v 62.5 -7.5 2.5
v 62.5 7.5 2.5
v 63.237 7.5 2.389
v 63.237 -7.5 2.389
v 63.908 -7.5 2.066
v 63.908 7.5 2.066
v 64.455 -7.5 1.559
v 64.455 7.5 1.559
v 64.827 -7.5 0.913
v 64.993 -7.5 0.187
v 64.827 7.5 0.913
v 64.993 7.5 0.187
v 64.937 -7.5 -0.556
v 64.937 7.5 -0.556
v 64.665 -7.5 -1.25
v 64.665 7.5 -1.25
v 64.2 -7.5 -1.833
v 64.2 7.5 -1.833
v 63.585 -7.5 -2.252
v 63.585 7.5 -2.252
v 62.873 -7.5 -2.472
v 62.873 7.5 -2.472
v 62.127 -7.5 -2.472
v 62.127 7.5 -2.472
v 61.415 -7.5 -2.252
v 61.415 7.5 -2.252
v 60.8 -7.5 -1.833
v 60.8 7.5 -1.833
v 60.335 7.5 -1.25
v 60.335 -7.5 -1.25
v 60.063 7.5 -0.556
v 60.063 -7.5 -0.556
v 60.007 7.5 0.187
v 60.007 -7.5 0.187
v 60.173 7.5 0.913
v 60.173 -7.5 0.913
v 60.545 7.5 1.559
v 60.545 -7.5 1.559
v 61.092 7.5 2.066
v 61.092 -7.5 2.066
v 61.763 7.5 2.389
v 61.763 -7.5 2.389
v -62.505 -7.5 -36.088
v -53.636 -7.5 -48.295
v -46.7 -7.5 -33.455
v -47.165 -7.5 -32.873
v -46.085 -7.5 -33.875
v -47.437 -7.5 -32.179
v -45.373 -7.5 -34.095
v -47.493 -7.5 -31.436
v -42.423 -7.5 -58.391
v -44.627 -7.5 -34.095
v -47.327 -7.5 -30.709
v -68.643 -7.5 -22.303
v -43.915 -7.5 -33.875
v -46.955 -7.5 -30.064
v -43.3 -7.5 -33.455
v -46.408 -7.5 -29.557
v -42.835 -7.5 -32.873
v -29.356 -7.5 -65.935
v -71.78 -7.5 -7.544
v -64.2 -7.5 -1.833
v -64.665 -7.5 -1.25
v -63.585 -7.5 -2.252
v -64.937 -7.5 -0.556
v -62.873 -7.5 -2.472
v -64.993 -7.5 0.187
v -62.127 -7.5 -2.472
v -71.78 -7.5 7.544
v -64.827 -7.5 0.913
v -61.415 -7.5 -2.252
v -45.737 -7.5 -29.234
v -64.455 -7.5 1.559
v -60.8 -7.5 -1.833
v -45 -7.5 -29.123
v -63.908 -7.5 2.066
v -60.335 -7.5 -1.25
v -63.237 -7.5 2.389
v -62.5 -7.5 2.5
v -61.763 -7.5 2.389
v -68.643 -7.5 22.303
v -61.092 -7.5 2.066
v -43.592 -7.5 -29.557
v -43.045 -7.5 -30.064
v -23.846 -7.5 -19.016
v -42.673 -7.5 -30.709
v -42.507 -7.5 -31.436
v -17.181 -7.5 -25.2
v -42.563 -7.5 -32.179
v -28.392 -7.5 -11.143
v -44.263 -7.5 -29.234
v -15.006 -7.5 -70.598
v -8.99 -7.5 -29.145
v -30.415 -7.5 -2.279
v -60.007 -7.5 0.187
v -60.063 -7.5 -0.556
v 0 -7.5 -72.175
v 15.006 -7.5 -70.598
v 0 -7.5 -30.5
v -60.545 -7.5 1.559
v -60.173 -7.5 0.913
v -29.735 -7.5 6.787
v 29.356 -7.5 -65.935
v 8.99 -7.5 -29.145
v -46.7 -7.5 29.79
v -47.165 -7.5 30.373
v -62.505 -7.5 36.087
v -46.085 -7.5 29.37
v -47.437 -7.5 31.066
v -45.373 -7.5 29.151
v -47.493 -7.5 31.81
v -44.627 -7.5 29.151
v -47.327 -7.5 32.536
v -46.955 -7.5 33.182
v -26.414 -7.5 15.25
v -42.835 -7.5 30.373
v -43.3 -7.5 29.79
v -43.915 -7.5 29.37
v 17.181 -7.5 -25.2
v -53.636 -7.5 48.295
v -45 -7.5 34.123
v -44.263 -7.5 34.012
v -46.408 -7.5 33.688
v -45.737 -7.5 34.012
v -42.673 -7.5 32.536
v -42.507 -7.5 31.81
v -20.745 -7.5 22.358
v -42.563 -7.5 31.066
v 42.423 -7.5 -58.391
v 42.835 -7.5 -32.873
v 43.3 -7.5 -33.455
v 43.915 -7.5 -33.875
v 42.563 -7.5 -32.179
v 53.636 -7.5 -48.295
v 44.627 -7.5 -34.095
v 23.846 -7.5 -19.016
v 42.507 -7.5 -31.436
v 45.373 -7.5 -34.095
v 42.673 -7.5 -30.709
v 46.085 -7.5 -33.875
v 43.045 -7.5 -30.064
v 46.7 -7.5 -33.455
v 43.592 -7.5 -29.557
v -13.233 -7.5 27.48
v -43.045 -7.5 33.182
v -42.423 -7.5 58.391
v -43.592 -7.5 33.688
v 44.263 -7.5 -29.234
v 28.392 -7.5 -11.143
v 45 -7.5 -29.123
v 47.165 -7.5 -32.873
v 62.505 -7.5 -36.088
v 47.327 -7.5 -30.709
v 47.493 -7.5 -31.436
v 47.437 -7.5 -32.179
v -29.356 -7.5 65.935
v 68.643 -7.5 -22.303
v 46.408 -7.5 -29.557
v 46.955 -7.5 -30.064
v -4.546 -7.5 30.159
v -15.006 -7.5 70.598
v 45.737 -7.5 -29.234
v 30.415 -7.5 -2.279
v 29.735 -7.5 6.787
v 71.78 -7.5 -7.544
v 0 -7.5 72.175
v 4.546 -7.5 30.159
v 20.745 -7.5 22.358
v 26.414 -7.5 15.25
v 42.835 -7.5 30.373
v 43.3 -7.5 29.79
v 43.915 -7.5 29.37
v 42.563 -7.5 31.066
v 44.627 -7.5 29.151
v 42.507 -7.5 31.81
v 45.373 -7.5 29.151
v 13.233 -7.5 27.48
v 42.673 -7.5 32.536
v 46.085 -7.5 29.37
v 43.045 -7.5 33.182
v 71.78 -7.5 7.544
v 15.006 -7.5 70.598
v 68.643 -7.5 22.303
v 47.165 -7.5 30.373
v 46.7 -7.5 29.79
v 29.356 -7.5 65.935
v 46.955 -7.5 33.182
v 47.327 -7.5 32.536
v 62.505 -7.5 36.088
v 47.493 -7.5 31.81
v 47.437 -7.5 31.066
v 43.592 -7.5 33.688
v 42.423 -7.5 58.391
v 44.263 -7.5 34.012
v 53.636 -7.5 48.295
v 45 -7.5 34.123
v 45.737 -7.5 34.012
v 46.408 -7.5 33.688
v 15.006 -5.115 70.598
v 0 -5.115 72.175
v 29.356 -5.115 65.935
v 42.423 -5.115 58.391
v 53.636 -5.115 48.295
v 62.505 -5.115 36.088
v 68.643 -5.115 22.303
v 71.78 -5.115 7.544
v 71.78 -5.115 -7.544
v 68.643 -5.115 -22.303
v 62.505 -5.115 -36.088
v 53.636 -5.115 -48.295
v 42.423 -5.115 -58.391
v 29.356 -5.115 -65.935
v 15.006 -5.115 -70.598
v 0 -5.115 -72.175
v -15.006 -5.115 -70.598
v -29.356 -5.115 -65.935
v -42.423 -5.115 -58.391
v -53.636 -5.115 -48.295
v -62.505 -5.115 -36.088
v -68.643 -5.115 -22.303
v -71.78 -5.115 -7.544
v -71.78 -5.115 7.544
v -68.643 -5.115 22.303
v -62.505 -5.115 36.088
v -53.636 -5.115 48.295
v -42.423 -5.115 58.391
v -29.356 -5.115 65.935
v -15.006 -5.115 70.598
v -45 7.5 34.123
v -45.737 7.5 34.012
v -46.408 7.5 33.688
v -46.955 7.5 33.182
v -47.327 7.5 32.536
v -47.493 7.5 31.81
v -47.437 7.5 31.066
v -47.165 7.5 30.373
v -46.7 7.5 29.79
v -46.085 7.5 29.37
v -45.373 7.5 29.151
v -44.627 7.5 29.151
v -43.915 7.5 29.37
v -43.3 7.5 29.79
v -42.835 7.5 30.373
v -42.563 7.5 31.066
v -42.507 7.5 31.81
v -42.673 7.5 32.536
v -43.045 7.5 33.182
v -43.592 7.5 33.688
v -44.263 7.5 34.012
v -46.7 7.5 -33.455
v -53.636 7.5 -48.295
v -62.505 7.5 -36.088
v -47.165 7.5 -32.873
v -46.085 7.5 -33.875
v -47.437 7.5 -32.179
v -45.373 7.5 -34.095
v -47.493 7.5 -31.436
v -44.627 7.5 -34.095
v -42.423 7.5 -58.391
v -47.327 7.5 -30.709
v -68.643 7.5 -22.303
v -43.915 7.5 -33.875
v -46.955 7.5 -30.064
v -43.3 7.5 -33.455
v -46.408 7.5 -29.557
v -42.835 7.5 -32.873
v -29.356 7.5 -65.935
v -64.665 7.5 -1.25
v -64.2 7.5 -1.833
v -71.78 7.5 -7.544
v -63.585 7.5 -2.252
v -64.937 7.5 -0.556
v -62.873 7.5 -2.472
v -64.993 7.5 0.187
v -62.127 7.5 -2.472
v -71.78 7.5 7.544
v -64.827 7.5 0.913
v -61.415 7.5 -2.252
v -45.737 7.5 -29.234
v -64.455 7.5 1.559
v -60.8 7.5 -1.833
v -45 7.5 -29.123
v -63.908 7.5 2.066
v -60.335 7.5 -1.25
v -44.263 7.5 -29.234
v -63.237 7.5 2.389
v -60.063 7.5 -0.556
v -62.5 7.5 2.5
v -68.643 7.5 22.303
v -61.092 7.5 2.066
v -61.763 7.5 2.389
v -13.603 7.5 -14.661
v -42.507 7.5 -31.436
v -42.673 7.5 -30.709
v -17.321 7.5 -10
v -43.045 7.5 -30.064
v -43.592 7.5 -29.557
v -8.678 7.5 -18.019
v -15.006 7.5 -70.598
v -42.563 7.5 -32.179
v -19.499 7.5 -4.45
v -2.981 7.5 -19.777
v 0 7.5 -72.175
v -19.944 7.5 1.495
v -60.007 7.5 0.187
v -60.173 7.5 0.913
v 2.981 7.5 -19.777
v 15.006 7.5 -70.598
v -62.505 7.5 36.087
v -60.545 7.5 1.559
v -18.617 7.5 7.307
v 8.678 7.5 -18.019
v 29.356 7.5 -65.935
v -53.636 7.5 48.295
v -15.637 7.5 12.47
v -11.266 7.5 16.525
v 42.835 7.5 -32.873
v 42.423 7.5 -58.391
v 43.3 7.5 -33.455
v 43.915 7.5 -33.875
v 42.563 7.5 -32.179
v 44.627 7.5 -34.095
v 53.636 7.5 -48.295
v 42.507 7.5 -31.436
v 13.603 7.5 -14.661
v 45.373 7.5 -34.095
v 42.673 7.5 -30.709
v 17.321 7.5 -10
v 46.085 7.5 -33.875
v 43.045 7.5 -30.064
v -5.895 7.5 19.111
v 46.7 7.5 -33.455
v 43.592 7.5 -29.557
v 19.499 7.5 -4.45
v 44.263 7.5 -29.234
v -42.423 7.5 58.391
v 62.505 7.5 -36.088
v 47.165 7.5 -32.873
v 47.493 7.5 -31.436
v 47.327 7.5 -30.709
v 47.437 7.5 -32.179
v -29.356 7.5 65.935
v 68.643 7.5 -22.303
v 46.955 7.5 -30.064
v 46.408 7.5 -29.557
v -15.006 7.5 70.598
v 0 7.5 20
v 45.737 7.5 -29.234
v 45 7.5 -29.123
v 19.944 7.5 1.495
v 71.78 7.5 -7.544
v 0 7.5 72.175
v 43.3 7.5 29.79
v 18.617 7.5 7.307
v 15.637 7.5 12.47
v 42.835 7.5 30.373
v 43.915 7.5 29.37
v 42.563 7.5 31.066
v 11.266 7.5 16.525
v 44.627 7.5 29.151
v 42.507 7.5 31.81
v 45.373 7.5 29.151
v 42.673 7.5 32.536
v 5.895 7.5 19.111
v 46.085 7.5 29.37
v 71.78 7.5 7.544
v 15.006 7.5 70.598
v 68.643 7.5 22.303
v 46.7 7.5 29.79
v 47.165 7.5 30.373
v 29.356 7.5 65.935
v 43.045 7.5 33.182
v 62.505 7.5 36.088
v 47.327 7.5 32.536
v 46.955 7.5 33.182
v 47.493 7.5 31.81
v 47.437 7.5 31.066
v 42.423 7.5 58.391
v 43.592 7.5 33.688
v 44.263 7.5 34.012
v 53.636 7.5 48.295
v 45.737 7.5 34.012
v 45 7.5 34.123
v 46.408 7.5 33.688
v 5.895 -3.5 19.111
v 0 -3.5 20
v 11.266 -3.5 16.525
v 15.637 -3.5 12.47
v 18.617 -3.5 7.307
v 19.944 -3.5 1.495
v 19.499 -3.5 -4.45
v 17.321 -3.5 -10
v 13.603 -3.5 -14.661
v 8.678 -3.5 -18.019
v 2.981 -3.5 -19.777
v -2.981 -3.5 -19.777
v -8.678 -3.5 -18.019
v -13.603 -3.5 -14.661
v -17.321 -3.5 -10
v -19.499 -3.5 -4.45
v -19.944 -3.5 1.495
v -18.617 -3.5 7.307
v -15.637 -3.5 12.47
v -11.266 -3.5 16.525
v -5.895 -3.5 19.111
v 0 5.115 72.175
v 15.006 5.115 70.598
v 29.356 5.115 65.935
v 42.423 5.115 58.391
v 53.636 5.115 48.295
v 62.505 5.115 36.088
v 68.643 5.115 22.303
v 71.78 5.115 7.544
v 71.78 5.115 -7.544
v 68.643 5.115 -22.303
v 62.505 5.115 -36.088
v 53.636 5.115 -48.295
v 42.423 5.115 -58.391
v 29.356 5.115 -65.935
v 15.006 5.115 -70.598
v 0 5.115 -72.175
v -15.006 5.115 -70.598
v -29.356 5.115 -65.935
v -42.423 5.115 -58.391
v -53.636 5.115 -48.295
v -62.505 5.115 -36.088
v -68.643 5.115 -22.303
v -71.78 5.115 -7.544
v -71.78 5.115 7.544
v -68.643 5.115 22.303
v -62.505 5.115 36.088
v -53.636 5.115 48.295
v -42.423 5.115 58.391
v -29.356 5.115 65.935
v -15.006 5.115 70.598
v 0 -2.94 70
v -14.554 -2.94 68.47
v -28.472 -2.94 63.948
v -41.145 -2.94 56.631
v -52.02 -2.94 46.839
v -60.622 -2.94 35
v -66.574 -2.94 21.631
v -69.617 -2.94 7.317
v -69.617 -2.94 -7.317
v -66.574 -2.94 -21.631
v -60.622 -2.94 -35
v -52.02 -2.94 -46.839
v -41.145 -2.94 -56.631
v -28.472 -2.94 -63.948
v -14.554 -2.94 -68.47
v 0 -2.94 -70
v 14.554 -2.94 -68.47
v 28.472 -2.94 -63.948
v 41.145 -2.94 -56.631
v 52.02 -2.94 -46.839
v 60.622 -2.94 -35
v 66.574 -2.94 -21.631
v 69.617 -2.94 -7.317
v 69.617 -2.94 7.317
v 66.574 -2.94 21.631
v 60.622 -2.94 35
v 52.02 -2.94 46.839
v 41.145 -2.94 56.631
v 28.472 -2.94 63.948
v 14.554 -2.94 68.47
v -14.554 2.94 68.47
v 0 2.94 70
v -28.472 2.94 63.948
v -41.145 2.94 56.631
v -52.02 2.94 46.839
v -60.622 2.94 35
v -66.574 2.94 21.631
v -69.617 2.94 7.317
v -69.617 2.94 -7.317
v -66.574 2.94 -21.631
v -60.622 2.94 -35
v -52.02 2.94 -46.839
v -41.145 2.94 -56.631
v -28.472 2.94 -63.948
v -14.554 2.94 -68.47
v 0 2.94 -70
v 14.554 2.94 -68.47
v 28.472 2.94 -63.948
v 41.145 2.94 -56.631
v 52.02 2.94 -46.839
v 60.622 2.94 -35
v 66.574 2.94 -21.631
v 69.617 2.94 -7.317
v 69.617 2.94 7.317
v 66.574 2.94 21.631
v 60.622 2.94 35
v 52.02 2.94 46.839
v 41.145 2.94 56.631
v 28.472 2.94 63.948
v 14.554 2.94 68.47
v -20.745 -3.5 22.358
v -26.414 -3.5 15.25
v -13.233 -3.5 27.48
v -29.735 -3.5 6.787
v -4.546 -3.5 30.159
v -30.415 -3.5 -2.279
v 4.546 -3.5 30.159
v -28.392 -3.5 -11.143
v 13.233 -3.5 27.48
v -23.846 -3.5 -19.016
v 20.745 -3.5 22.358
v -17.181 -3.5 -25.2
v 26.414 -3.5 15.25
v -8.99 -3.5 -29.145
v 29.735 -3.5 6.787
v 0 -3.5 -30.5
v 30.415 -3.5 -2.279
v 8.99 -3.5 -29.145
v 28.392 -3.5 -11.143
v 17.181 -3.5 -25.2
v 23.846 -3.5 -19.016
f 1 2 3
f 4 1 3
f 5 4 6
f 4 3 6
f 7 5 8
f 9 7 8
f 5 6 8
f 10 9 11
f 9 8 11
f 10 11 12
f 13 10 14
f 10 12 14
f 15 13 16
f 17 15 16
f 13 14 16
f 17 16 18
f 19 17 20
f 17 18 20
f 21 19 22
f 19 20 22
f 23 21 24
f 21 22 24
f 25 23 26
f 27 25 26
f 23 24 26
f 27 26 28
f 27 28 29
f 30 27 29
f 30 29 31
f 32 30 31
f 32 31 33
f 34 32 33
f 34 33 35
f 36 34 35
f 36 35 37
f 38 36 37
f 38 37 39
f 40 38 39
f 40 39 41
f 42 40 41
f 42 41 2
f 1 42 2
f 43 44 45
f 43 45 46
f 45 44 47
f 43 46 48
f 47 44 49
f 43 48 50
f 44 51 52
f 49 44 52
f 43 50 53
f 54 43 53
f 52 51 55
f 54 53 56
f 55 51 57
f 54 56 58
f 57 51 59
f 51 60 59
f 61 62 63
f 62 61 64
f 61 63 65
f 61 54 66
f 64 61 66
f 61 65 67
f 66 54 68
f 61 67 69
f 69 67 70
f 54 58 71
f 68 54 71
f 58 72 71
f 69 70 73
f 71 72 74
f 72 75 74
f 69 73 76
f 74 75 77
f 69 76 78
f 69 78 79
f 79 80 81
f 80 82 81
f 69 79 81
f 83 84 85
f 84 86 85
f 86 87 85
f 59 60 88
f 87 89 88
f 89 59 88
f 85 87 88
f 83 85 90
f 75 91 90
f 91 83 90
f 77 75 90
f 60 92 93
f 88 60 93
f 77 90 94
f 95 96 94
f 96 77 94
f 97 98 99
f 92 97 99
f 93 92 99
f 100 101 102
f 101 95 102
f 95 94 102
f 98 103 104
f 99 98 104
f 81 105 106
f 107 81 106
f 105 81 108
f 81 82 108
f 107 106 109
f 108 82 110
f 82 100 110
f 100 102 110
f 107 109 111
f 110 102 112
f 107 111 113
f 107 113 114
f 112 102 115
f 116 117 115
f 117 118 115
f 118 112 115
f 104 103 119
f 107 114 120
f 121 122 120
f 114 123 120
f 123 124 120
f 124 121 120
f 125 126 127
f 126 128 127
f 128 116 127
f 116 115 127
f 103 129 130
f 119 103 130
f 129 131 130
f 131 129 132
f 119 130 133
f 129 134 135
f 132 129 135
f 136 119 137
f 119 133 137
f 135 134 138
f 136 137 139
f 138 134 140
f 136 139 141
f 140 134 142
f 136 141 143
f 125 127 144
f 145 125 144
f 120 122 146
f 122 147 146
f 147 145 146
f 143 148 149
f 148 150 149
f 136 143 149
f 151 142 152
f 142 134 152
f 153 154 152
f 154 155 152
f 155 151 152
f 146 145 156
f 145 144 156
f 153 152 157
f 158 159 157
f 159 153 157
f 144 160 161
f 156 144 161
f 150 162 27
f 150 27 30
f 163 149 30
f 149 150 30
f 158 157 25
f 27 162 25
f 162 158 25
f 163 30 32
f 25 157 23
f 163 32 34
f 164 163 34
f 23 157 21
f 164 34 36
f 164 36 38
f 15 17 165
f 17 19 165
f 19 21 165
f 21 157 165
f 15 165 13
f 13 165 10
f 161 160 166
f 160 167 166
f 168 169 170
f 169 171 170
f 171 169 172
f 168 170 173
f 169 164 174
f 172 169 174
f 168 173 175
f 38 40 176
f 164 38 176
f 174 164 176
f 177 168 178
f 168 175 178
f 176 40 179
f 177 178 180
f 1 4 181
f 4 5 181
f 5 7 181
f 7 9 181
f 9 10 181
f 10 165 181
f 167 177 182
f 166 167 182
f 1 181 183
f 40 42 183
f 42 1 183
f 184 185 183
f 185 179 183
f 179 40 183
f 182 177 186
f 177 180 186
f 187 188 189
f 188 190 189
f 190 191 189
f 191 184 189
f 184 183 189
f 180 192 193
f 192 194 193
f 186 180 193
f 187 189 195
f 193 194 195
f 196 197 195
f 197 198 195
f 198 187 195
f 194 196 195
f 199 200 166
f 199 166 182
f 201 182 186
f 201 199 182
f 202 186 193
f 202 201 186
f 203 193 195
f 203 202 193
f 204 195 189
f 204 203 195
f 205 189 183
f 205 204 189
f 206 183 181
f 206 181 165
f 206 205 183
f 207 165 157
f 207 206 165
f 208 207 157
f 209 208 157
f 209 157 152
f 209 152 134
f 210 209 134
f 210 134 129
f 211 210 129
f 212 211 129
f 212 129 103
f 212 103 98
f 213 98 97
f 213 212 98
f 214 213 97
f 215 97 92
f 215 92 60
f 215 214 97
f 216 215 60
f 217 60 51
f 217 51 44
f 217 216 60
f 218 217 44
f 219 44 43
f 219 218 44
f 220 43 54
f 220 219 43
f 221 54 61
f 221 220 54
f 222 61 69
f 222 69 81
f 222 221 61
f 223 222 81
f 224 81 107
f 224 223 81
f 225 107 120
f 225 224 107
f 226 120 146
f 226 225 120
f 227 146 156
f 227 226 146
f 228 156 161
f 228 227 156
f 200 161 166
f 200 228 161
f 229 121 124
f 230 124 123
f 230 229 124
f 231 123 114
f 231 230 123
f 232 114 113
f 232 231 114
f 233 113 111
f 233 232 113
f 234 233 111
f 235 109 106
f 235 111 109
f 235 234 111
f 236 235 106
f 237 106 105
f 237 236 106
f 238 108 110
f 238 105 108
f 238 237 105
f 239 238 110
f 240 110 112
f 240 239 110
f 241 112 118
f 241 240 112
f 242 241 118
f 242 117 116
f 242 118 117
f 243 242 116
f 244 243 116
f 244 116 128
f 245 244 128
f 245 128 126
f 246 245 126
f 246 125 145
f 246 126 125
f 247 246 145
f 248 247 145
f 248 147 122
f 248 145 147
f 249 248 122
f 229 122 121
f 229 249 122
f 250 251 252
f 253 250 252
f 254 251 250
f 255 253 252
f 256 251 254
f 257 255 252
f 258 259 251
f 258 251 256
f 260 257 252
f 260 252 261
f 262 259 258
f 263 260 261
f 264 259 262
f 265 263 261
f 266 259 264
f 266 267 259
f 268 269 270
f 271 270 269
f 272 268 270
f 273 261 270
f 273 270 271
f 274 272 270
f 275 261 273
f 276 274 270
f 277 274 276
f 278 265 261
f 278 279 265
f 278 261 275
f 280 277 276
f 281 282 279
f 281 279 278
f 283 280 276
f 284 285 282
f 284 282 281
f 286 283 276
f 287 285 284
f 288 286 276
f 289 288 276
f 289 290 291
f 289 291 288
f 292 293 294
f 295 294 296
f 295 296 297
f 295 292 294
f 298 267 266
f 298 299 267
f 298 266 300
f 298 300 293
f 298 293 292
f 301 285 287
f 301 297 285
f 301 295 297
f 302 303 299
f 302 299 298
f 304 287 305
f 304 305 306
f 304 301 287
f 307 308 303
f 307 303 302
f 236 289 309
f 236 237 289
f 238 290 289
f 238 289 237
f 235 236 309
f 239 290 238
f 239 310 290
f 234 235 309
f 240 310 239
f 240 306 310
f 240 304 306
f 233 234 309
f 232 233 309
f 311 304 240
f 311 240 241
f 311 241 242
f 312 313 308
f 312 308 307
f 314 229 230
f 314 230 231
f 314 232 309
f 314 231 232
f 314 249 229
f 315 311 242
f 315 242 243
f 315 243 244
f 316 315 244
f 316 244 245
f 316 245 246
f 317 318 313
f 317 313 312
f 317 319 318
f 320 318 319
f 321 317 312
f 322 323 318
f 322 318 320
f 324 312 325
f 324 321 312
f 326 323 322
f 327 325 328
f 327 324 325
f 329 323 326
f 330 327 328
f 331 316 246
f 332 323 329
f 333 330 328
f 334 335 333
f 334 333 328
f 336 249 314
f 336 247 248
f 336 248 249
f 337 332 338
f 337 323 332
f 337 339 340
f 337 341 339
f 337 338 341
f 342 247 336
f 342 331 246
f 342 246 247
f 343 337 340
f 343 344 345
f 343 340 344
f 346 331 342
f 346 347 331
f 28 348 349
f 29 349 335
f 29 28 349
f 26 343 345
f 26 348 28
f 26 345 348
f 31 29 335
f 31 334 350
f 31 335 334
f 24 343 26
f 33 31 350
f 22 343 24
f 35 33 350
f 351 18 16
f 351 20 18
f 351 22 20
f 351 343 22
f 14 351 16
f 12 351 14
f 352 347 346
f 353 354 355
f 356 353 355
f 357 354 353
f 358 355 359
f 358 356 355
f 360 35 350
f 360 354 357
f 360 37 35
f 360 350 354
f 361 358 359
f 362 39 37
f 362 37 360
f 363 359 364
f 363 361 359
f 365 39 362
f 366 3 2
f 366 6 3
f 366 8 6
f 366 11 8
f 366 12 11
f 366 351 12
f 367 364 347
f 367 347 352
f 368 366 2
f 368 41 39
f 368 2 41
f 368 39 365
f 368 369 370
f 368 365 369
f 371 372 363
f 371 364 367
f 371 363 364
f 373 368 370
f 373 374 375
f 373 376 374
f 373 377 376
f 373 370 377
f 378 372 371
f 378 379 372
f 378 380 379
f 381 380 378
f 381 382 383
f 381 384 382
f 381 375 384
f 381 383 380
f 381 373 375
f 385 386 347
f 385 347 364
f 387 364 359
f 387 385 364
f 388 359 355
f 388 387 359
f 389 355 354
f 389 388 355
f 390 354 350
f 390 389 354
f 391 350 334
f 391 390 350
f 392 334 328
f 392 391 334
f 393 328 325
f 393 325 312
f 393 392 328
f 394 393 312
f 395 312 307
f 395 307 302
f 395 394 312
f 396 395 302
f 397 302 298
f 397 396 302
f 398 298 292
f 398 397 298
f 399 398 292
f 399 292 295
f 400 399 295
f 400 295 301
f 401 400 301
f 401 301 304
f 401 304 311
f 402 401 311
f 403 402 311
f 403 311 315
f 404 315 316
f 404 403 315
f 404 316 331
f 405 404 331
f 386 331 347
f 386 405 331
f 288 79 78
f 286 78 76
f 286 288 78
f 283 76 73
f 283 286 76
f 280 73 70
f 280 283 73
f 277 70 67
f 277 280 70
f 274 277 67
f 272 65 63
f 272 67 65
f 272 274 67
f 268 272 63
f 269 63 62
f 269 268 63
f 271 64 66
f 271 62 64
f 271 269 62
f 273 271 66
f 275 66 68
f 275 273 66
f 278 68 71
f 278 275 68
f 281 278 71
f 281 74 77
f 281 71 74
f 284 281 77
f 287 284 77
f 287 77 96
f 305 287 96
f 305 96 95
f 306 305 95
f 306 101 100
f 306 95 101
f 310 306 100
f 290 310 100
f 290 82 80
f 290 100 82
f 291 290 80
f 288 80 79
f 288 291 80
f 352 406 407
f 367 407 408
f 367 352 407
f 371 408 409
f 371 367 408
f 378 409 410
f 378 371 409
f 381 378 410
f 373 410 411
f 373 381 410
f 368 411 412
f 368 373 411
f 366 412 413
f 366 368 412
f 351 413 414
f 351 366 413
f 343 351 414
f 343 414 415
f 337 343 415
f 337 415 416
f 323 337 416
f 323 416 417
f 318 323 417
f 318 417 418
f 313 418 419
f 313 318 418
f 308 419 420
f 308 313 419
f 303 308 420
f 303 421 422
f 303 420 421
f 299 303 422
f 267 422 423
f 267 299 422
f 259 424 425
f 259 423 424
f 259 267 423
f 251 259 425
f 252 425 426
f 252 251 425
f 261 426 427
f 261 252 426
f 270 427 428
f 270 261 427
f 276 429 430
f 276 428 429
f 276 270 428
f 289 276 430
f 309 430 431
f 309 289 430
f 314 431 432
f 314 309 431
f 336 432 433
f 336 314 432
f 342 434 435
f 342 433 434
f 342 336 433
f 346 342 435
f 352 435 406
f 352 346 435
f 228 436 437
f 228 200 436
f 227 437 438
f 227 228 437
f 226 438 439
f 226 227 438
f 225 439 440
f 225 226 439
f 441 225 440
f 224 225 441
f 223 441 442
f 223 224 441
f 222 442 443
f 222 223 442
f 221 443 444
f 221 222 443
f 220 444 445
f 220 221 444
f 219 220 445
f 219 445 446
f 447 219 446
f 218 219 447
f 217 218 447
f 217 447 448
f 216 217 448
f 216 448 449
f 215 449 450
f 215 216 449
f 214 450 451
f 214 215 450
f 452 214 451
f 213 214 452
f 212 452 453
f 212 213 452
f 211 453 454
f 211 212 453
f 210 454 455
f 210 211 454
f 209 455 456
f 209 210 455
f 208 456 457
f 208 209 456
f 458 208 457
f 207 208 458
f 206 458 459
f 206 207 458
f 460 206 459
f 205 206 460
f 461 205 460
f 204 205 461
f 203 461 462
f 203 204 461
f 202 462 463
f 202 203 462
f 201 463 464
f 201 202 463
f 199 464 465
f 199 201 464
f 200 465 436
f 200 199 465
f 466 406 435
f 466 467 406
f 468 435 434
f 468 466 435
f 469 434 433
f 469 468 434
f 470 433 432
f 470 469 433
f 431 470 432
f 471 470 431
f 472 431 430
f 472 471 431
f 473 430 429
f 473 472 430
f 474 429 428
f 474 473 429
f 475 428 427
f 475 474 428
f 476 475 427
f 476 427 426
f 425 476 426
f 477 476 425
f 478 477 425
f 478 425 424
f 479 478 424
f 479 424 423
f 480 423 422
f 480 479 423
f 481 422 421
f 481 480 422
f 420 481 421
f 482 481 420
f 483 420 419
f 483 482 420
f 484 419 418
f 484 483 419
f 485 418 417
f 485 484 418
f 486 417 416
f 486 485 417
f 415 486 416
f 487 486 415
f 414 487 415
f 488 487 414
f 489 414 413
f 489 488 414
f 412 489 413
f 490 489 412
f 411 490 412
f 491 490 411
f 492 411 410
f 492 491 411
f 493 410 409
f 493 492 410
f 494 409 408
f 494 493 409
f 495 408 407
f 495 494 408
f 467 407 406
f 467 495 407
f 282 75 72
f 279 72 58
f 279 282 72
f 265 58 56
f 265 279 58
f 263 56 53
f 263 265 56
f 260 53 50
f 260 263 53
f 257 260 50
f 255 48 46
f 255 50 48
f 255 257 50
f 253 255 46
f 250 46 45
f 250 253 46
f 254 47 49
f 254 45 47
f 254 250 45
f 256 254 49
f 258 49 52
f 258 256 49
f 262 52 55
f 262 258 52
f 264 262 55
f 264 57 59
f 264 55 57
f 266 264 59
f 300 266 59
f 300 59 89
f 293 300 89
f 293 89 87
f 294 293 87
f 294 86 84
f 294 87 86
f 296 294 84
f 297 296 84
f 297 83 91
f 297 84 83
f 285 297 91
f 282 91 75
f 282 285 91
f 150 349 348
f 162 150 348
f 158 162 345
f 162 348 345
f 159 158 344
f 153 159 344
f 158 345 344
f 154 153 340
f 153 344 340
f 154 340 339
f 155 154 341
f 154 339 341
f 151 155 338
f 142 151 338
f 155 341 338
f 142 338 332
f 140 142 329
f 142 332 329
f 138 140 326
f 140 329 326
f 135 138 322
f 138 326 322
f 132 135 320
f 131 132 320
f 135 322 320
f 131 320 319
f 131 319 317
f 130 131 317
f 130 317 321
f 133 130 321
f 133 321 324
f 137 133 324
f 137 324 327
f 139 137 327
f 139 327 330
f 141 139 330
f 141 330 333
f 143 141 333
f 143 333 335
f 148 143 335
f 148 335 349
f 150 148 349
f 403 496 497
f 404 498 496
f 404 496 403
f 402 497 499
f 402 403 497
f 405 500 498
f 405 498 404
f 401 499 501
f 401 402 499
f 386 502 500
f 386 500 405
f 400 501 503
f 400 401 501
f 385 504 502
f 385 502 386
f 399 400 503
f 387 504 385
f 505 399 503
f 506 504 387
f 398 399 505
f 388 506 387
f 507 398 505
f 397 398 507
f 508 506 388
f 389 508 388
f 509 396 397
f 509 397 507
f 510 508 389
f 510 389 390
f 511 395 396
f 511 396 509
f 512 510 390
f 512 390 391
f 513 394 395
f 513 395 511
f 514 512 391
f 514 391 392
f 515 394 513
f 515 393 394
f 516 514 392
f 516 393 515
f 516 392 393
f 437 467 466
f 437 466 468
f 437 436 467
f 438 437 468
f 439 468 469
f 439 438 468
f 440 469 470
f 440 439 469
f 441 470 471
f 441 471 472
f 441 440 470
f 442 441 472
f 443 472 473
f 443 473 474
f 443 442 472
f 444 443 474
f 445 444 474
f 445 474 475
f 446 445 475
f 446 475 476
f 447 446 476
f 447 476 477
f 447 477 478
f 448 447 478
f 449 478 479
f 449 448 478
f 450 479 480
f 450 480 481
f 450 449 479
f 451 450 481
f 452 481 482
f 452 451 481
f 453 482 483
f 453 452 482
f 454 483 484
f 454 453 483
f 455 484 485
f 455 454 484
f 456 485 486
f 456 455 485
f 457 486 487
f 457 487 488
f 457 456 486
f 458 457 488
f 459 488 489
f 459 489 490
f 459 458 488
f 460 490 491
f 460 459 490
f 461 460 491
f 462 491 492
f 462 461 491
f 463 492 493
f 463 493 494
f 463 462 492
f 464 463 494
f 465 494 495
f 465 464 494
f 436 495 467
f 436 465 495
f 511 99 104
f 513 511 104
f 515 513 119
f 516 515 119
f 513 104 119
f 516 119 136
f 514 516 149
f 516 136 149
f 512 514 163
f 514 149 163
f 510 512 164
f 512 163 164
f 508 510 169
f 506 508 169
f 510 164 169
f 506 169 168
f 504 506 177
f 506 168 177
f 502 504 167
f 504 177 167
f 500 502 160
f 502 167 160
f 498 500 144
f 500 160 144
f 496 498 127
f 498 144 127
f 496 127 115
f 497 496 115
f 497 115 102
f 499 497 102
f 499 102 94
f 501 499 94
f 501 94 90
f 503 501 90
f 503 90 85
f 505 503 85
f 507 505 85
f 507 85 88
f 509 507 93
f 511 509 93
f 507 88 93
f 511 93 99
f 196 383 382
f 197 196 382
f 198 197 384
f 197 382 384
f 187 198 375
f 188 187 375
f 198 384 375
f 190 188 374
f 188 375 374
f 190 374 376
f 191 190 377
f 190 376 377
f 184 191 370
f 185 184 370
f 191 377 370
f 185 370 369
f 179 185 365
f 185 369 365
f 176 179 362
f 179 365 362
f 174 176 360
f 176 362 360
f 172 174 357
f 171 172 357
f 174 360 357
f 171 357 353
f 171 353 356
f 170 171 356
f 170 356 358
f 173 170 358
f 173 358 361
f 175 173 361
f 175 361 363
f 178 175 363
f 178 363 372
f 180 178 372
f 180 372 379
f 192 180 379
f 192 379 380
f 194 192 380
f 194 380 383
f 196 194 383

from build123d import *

# Parameters (mm, degrees)
SKETCH1_R           = 72.175
SKETCH1_R_2         = 20
BOSS_EXTRUDE1_DEPTH = 7.5
SKETCH3_R           = 30.5
CUT_EXTRUDE1_DEPTH  = 4
SKETCH4_R           = 2.5
CUT_EXTRUDE2_DEPTH  = 104.167151991


with BuildPart() as part:
    # Sketch1 → Boss-Extrude1 (new, symmetric)
    with BuildSketch(Plane(origin=(0, 0, 0), x_dir=(1, 0, 0), z_dir=(0, 1, 0))):
        with Locations(Location((0, 0, 0), (0, 0, 270))):
            Circle(SKETCH1_R)
        with Locations(Location((0, 0, 0), (0, 0, 270))):
            Circle(SKETCH1_R_2, mode=Mode.SUBTRACT)
    extrude(amount=BOSS_EXTRUDE1_DEPTH, both=True)

    # Sketch2 → Cut-Revolve1 (revolve, cut)
    with BuildSketch(Plane.XY, mode=Mode.PRIVATE) as cut_revolve1_sk:
        Polygon((72.175, -5.115), (72.175, 5.115), (70, 2.94), (70, -2.94), align=None)
    revolve(cut_revolve1_sk.sketch.rotate(Axis((0, 6.6, 0), (0, -1, 0)), 90), axis=Axis((0, 6.6, 0), (0, -1, 0)), mode=Mode.SUBTRACT)

    # Sketch3 → Cut-Extrude1 (cut)
    with BuildSketch(Plane.XZ.offset(7.5)):
        with Locations(Location((0, 0, 0), (0, 0, 270))):
            Circle(SKETCH3_R)
    extrude(amount=-CUT_EXTRUDE1_DEPTH, mode=Mode.SUBTRACT)

    # Sketch4 → Cut-Extrude2 (cut, through all)
    with BuildSketch(Plane(origin=(0, 7.5, 0), x_dir=(1, 0, 0), z_dir=(0, 1, 0))):
        with Locations(Location((62.5, 0, 0), (0, 0, 270))):
            Circle(SKETCH4_R)
        with Locations(Location((45, 31.622776602, 0), (0, 0, 270))):
            Circle(SKETCH4_R)
        with Locations(Location((45, -31.622776602, 0), (0, 0, 270))):
            Circle(SKETCH4_R)
    cut_extrude2 = extrude(amount=-CUT_EXTRUDE2_DEPTH, mode=Mode.SUBTRACT)

    # Mirror1: Cut-Extrude2 across plane
    add(cut_extrude2.mirror(Plane(origin=(0, 0, 0), x_dir=(0, 0, 1), z_dir=(1, 0, 0))), mode=Mode.SUBTRACT)


solid = part.part
